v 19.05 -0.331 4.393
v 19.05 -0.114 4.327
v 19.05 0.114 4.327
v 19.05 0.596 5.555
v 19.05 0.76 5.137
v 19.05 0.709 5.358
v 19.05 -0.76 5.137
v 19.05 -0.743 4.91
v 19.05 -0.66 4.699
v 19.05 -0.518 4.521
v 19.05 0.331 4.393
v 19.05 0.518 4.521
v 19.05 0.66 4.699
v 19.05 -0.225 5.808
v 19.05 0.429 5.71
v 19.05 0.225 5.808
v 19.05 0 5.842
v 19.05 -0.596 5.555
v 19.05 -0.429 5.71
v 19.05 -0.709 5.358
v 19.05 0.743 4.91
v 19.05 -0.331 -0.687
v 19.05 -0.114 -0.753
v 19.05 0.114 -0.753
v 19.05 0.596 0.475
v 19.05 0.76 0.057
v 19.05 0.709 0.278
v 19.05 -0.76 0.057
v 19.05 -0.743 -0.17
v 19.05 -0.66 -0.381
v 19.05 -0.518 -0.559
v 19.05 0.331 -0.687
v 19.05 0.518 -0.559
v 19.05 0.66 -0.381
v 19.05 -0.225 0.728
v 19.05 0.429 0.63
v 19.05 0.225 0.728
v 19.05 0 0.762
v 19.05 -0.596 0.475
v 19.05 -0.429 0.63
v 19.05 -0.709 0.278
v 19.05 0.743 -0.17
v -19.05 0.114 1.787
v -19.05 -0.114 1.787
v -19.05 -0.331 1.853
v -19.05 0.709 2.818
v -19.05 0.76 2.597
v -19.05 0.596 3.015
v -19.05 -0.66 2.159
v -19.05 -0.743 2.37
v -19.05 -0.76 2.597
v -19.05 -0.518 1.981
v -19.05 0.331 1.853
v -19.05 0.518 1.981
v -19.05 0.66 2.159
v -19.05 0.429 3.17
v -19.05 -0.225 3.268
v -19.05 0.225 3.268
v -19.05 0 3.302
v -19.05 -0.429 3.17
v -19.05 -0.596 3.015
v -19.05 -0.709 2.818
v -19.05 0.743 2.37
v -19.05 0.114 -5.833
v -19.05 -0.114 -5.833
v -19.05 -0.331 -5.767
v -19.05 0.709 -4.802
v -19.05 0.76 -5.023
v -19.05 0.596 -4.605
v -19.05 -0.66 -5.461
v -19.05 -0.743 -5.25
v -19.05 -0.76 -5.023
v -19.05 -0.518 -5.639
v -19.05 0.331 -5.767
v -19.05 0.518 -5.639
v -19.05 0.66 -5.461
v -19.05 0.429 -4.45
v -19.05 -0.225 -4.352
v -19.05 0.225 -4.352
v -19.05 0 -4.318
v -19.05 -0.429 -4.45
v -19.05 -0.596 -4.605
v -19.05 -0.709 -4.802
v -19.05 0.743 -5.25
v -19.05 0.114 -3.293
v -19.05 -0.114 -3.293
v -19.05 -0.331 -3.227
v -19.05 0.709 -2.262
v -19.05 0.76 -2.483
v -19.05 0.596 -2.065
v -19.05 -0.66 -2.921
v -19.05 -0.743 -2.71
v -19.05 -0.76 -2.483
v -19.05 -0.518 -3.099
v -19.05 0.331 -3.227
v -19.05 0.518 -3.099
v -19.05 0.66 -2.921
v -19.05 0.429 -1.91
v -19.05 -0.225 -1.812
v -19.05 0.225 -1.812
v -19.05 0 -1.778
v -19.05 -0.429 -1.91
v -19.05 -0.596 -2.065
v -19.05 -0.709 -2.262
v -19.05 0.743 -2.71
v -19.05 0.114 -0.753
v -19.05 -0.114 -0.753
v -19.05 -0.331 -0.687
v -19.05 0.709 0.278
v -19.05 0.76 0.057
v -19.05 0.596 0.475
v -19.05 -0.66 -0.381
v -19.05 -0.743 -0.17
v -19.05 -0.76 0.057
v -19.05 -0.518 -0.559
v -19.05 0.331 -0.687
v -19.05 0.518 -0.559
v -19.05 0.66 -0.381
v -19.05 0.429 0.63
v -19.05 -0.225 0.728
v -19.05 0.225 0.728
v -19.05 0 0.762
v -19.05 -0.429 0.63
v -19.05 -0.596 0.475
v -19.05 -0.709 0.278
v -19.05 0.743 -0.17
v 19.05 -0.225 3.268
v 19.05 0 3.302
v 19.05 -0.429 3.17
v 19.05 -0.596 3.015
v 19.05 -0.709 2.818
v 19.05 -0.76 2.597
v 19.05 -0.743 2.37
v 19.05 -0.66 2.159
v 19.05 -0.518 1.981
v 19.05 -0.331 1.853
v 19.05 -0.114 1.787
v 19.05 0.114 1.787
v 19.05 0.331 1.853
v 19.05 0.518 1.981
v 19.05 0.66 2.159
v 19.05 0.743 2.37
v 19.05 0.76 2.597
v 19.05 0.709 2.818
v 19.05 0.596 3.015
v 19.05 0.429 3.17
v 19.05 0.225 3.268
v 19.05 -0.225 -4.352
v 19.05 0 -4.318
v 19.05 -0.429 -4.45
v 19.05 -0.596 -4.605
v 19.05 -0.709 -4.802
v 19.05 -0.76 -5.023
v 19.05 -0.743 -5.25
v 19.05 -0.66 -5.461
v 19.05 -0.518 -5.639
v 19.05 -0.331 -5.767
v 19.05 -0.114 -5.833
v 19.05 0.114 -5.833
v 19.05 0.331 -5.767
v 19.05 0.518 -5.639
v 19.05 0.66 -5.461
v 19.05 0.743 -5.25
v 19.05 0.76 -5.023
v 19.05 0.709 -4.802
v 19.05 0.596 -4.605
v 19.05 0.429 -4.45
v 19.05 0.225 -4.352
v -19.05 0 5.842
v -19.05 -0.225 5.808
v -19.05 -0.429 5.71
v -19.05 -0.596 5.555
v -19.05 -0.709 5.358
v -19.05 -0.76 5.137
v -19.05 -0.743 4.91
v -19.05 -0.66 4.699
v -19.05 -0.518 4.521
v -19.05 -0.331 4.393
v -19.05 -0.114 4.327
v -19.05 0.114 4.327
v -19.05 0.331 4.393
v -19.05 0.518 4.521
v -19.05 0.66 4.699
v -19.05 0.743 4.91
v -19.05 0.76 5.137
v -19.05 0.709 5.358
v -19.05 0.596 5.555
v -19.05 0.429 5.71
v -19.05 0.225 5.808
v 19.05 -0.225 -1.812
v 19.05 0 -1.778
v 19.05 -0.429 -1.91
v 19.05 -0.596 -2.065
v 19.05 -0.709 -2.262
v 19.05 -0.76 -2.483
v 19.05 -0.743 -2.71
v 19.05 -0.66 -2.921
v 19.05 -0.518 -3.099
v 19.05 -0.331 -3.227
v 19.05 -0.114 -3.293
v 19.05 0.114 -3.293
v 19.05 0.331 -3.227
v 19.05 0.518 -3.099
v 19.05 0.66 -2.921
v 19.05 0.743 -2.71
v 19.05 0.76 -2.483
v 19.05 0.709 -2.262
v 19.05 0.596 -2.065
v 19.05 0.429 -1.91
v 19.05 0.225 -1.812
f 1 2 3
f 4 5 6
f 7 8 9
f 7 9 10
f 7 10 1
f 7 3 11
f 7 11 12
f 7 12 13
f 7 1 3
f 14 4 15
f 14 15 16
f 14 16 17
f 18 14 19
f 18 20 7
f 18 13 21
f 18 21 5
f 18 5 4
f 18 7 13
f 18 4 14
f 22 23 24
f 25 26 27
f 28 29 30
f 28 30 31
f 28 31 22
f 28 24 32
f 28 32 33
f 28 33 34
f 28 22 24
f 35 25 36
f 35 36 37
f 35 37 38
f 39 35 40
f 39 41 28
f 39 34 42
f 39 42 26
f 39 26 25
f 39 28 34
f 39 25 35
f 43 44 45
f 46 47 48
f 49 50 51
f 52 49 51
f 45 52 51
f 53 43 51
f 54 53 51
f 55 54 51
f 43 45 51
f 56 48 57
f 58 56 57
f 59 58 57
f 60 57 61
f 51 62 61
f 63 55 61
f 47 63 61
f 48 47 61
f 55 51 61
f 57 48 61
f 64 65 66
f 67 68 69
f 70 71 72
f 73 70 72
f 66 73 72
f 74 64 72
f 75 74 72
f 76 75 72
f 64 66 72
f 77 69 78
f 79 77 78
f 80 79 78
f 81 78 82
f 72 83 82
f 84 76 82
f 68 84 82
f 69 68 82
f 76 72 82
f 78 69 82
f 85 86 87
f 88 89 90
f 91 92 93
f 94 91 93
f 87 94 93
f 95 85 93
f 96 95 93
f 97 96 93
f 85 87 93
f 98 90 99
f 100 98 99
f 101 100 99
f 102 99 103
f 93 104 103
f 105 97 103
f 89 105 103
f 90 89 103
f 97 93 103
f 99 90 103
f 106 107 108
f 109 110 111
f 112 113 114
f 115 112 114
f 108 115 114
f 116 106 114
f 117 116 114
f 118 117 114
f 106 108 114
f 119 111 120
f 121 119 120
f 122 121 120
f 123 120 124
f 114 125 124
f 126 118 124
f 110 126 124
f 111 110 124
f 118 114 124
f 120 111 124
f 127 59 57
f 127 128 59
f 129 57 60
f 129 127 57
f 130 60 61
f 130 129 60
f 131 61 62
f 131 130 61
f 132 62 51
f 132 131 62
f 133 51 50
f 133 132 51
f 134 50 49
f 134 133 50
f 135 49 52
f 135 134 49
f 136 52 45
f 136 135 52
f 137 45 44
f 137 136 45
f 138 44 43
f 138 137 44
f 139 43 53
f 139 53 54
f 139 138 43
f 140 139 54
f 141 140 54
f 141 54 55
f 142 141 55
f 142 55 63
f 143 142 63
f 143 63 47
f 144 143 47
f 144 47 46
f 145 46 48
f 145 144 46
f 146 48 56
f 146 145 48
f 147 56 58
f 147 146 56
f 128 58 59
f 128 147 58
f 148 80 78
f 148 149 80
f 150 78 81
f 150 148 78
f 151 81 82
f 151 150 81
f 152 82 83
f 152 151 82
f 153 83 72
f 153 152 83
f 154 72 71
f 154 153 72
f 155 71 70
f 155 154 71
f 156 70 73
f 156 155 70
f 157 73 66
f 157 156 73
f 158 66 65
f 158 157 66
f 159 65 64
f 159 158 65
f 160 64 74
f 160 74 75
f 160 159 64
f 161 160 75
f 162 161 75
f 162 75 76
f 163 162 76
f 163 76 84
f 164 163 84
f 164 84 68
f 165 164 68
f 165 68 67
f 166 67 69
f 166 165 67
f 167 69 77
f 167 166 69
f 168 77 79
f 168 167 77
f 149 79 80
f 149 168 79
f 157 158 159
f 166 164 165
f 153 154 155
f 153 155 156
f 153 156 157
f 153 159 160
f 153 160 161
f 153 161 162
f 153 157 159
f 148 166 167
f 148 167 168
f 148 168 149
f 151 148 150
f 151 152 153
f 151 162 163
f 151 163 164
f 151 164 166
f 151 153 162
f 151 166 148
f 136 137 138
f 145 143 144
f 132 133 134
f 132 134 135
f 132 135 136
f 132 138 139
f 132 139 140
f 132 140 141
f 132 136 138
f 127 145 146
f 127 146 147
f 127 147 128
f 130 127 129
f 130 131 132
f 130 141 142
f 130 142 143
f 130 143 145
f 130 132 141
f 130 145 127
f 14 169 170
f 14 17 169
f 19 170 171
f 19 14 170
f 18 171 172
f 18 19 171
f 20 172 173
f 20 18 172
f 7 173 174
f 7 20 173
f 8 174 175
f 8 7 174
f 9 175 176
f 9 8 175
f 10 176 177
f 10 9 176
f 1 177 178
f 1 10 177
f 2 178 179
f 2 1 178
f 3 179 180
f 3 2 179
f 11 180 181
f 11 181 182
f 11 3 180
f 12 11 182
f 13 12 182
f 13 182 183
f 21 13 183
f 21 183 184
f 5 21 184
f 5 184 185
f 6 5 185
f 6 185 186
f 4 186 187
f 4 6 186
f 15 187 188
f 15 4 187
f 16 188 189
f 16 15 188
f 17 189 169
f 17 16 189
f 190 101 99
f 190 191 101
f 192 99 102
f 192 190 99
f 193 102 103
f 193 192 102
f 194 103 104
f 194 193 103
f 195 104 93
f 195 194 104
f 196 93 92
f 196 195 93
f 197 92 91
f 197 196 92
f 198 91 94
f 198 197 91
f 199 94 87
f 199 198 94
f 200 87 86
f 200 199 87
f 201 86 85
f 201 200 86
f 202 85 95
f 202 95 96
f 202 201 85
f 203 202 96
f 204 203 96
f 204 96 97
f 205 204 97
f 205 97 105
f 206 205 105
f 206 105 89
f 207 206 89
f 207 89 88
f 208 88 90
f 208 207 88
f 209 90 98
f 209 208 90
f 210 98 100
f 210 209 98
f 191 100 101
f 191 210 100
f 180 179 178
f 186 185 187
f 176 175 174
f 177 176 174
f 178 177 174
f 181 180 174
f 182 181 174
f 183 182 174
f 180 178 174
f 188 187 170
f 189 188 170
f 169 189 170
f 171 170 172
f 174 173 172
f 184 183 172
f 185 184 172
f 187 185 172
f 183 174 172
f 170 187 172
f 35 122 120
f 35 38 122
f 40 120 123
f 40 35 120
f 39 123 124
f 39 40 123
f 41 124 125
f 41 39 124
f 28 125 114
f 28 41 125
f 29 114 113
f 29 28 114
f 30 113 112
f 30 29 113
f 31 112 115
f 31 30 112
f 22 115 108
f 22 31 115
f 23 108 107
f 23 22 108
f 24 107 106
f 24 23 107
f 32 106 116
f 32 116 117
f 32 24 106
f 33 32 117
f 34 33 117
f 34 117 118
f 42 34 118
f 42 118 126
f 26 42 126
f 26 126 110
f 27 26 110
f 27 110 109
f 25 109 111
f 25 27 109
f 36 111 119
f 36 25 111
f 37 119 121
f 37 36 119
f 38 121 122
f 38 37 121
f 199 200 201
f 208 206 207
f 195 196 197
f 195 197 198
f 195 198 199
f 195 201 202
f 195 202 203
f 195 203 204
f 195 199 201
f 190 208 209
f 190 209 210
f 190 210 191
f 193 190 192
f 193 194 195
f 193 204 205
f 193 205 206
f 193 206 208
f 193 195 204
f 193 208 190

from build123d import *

# Parameters (mm, degrees)
SKETCH1_R             = 0.762
BOSS_EXTRUDE1_DEPTH   = 19.05
BOSS_EXTRUDE1_2_DEPTH = 19.05
BOSS_EXTRUDE1_3_DEPTH = 19.05
BOSS_EXTRUDE1_4_DEPTH = 19.05
BOSS_EXTRUDE1_5_DEPTH = 19.05


with BuildPart() as part:
    # Sketch1 → Boss-Extrude1 (new, symmetric)
    with BuildSketch(Plane(origin=(0, 0, 0), x_dir=(0, 0, -1), z_dir=(1, 0, 0))):
        with Locations(Location((0, 0, 0), (0, 0, 180))):
            Circle(SKETCH1_R)
    extrude(amount=BOSS_EXTRUDE1_DEPTH, both=True)


with BuildPart() as body_2:
    # Sketch1 → Boss-Extrude1 2 (new, symmetric)
    with BuildSketch(Plane(origin=(0, 0, 0), x_dir=(0, 0, -1), z_dir=(1, 0, 0))):
        with Locations(Location((-5.08, 0, 0), (0, 0, 180))):
            Circle(SKETCH1_R)
    extrude(amount=BOSS_EXTRUDE1_2_DEPTH, both=True)


with BuildPart() as body_3:
    # Sketch1 → Boss-Extrude1 3 (new, symmetric)
    with BuildSketch(Plane(origin=(0, 0, 0), x_dir=(0, 0, -1), z_dir=(1, 0, 0))):
        with Locations(Location((-2.54, 0, 0), (0, 0, 180))):
            Circle(SKETCH1_R)
    extrude(amount=BOSS_EXTRUDE1_3_DEPTH, both=True)


with BuildPart() as body_4:
    # Sketch1 → Boss-Extrude1 4 (new, symmetric)
    with BuildSketch(Plane(origin=(0, 0, 0), x_dir=(0, 0, -1), z_dir=(1, 0, 0))):
        with Locations(Location((2.54, 0, 0), (0, 0, 180))):
            Circle(SKETCH1_R)
    extrude(amount=BOSS_EXTRUDE1_4_DEPTH, both=True)


with BuildPart() as body_5:
    # Sketch1 → Boss-Extrude1 5 (new, symmetric)
    with BuildSketch(Plane(origin=(0, 0, 0), x_dir=(0, 0, -1), z_dir=(1, 0, 0))):
        with Locations(Location((5.08, 0, 0), (0, 0, 180))):
            Circle(SKETCH1_R)
    extrude(amount=BOSS_EXTRUDE1_5_DEPTH, both=True)


solid = Compound([part.part, body_2.part, body_3.part, body_4.part, body_5.part])
